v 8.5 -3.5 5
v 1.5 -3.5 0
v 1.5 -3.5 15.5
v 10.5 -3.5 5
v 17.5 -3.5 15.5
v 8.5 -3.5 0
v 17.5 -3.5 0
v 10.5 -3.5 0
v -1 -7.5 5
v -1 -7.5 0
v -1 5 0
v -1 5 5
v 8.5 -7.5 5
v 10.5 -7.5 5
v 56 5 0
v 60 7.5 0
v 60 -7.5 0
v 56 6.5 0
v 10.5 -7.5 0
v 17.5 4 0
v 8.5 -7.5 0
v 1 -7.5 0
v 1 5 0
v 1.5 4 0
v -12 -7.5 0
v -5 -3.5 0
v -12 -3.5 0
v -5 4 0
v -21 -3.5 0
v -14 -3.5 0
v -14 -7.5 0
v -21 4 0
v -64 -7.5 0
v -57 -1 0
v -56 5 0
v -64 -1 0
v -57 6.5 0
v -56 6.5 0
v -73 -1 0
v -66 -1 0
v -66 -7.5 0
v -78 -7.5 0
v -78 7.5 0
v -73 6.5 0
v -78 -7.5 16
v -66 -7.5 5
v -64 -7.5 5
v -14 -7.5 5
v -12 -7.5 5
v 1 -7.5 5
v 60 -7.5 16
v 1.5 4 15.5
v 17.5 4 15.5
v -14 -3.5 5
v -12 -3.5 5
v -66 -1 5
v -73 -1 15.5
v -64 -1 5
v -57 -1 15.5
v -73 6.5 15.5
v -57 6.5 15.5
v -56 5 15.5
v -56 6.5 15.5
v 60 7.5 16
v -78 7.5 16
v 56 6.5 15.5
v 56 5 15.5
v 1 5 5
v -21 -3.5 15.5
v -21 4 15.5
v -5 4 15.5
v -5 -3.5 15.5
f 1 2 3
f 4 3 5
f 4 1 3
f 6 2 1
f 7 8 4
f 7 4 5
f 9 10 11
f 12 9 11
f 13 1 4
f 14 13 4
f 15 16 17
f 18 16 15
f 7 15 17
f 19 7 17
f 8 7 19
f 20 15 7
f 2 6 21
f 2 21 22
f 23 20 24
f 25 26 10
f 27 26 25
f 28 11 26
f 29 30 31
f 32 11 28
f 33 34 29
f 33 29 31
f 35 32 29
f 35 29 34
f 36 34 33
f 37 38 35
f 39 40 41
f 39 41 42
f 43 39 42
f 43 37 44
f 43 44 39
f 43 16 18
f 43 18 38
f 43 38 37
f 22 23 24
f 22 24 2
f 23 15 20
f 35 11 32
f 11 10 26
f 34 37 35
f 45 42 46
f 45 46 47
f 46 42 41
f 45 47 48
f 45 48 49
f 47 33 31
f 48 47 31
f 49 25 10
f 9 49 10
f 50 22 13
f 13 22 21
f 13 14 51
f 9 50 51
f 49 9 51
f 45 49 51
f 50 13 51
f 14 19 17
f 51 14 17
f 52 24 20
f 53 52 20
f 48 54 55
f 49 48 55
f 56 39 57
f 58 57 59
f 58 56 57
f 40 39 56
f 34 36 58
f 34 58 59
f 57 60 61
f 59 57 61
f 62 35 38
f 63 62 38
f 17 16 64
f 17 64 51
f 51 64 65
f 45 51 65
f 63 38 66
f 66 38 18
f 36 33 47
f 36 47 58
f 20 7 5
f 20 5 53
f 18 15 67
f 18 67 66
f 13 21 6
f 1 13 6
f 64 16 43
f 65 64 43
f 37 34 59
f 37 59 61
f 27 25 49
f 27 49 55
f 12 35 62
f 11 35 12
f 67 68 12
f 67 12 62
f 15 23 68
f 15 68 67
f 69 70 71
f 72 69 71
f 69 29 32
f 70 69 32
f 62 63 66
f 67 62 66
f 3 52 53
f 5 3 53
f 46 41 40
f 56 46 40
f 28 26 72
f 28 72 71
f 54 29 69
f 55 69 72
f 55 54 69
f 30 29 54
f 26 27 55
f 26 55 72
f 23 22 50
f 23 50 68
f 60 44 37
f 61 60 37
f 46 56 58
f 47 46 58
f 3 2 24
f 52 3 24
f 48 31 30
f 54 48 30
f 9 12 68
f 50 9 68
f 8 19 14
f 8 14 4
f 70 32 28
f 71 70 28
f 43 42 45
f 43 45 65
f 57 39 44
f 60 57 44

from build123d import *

# Parameters (mm, degrees)
PAD_DEPTH       = 16
SKETCH001_W     = 112
SKETCH001_H     = 1.5
SKETCH001_W_2   = 16
SKETCH001_H_2   = 7.5
POCKET_DEPTH    = 15.5
SKETCH002_W     = 2
SKETCH002_H     = 12.5
SKETCH002_H_2   = 4
SKETCH002_H_3   = 6.5
POCKET001_DEPTH = 5


with BuildPart() as part:
    # Sketch → Pad (new body)
    with BuildSketch(Plane.XY):
        Polygon((-60, 7.5), (60, 7.5), (60, -7.5), (-60, -7.5), (-78, -7.5), (-78, 7.5), align=None)
    extrude(amount=PAD_DEPTH)

    # Sketch001 → Pocket (cut)
    with BuildSketch(Plane.XY):
        with Locations((0, 5.75)):
            Rectangle(SKETCH001_W, SKETCH001_H)
        with Locations((9.5, 0.25)):
            Rectangle(SKETCH001_W_2, SKETCH001_H_2)
        with Locations((-13, 0.25)):
            Rectangle(SKETCH001_W_2, SKETCH001_H_2)
        with Locations((-65, 2.75)):
            Rectangle(SKETCH001_W_2, SKETCH001_H_2)
    extrude(amount=POCKET_DEPTH, mode=Mode.SUBTRACT)

    # Sketch002 → Pocket001 (cut)
    with BuildSketch(Plane.XY):
        with Locations((0, -1.25)):
            Rectangle(SKETCH002_W, SKETCH002_H)
        with Locations((-13, -5.5)):
            Rectangle(SKETCH002_W, SKETCH002_H_2)
        with Locations((9.5, -5.5)):
            Rectangle(SKETCH002_W, SKETCH002_H_2)
        with Locations((-65, -4.25)):
            Rectangle(SKETCH002_W, SKETCH002_H_3)
    extrude(amount=POCKET001_DEPTH, mode=Mode.SUBTRACT)


solid = part.part
